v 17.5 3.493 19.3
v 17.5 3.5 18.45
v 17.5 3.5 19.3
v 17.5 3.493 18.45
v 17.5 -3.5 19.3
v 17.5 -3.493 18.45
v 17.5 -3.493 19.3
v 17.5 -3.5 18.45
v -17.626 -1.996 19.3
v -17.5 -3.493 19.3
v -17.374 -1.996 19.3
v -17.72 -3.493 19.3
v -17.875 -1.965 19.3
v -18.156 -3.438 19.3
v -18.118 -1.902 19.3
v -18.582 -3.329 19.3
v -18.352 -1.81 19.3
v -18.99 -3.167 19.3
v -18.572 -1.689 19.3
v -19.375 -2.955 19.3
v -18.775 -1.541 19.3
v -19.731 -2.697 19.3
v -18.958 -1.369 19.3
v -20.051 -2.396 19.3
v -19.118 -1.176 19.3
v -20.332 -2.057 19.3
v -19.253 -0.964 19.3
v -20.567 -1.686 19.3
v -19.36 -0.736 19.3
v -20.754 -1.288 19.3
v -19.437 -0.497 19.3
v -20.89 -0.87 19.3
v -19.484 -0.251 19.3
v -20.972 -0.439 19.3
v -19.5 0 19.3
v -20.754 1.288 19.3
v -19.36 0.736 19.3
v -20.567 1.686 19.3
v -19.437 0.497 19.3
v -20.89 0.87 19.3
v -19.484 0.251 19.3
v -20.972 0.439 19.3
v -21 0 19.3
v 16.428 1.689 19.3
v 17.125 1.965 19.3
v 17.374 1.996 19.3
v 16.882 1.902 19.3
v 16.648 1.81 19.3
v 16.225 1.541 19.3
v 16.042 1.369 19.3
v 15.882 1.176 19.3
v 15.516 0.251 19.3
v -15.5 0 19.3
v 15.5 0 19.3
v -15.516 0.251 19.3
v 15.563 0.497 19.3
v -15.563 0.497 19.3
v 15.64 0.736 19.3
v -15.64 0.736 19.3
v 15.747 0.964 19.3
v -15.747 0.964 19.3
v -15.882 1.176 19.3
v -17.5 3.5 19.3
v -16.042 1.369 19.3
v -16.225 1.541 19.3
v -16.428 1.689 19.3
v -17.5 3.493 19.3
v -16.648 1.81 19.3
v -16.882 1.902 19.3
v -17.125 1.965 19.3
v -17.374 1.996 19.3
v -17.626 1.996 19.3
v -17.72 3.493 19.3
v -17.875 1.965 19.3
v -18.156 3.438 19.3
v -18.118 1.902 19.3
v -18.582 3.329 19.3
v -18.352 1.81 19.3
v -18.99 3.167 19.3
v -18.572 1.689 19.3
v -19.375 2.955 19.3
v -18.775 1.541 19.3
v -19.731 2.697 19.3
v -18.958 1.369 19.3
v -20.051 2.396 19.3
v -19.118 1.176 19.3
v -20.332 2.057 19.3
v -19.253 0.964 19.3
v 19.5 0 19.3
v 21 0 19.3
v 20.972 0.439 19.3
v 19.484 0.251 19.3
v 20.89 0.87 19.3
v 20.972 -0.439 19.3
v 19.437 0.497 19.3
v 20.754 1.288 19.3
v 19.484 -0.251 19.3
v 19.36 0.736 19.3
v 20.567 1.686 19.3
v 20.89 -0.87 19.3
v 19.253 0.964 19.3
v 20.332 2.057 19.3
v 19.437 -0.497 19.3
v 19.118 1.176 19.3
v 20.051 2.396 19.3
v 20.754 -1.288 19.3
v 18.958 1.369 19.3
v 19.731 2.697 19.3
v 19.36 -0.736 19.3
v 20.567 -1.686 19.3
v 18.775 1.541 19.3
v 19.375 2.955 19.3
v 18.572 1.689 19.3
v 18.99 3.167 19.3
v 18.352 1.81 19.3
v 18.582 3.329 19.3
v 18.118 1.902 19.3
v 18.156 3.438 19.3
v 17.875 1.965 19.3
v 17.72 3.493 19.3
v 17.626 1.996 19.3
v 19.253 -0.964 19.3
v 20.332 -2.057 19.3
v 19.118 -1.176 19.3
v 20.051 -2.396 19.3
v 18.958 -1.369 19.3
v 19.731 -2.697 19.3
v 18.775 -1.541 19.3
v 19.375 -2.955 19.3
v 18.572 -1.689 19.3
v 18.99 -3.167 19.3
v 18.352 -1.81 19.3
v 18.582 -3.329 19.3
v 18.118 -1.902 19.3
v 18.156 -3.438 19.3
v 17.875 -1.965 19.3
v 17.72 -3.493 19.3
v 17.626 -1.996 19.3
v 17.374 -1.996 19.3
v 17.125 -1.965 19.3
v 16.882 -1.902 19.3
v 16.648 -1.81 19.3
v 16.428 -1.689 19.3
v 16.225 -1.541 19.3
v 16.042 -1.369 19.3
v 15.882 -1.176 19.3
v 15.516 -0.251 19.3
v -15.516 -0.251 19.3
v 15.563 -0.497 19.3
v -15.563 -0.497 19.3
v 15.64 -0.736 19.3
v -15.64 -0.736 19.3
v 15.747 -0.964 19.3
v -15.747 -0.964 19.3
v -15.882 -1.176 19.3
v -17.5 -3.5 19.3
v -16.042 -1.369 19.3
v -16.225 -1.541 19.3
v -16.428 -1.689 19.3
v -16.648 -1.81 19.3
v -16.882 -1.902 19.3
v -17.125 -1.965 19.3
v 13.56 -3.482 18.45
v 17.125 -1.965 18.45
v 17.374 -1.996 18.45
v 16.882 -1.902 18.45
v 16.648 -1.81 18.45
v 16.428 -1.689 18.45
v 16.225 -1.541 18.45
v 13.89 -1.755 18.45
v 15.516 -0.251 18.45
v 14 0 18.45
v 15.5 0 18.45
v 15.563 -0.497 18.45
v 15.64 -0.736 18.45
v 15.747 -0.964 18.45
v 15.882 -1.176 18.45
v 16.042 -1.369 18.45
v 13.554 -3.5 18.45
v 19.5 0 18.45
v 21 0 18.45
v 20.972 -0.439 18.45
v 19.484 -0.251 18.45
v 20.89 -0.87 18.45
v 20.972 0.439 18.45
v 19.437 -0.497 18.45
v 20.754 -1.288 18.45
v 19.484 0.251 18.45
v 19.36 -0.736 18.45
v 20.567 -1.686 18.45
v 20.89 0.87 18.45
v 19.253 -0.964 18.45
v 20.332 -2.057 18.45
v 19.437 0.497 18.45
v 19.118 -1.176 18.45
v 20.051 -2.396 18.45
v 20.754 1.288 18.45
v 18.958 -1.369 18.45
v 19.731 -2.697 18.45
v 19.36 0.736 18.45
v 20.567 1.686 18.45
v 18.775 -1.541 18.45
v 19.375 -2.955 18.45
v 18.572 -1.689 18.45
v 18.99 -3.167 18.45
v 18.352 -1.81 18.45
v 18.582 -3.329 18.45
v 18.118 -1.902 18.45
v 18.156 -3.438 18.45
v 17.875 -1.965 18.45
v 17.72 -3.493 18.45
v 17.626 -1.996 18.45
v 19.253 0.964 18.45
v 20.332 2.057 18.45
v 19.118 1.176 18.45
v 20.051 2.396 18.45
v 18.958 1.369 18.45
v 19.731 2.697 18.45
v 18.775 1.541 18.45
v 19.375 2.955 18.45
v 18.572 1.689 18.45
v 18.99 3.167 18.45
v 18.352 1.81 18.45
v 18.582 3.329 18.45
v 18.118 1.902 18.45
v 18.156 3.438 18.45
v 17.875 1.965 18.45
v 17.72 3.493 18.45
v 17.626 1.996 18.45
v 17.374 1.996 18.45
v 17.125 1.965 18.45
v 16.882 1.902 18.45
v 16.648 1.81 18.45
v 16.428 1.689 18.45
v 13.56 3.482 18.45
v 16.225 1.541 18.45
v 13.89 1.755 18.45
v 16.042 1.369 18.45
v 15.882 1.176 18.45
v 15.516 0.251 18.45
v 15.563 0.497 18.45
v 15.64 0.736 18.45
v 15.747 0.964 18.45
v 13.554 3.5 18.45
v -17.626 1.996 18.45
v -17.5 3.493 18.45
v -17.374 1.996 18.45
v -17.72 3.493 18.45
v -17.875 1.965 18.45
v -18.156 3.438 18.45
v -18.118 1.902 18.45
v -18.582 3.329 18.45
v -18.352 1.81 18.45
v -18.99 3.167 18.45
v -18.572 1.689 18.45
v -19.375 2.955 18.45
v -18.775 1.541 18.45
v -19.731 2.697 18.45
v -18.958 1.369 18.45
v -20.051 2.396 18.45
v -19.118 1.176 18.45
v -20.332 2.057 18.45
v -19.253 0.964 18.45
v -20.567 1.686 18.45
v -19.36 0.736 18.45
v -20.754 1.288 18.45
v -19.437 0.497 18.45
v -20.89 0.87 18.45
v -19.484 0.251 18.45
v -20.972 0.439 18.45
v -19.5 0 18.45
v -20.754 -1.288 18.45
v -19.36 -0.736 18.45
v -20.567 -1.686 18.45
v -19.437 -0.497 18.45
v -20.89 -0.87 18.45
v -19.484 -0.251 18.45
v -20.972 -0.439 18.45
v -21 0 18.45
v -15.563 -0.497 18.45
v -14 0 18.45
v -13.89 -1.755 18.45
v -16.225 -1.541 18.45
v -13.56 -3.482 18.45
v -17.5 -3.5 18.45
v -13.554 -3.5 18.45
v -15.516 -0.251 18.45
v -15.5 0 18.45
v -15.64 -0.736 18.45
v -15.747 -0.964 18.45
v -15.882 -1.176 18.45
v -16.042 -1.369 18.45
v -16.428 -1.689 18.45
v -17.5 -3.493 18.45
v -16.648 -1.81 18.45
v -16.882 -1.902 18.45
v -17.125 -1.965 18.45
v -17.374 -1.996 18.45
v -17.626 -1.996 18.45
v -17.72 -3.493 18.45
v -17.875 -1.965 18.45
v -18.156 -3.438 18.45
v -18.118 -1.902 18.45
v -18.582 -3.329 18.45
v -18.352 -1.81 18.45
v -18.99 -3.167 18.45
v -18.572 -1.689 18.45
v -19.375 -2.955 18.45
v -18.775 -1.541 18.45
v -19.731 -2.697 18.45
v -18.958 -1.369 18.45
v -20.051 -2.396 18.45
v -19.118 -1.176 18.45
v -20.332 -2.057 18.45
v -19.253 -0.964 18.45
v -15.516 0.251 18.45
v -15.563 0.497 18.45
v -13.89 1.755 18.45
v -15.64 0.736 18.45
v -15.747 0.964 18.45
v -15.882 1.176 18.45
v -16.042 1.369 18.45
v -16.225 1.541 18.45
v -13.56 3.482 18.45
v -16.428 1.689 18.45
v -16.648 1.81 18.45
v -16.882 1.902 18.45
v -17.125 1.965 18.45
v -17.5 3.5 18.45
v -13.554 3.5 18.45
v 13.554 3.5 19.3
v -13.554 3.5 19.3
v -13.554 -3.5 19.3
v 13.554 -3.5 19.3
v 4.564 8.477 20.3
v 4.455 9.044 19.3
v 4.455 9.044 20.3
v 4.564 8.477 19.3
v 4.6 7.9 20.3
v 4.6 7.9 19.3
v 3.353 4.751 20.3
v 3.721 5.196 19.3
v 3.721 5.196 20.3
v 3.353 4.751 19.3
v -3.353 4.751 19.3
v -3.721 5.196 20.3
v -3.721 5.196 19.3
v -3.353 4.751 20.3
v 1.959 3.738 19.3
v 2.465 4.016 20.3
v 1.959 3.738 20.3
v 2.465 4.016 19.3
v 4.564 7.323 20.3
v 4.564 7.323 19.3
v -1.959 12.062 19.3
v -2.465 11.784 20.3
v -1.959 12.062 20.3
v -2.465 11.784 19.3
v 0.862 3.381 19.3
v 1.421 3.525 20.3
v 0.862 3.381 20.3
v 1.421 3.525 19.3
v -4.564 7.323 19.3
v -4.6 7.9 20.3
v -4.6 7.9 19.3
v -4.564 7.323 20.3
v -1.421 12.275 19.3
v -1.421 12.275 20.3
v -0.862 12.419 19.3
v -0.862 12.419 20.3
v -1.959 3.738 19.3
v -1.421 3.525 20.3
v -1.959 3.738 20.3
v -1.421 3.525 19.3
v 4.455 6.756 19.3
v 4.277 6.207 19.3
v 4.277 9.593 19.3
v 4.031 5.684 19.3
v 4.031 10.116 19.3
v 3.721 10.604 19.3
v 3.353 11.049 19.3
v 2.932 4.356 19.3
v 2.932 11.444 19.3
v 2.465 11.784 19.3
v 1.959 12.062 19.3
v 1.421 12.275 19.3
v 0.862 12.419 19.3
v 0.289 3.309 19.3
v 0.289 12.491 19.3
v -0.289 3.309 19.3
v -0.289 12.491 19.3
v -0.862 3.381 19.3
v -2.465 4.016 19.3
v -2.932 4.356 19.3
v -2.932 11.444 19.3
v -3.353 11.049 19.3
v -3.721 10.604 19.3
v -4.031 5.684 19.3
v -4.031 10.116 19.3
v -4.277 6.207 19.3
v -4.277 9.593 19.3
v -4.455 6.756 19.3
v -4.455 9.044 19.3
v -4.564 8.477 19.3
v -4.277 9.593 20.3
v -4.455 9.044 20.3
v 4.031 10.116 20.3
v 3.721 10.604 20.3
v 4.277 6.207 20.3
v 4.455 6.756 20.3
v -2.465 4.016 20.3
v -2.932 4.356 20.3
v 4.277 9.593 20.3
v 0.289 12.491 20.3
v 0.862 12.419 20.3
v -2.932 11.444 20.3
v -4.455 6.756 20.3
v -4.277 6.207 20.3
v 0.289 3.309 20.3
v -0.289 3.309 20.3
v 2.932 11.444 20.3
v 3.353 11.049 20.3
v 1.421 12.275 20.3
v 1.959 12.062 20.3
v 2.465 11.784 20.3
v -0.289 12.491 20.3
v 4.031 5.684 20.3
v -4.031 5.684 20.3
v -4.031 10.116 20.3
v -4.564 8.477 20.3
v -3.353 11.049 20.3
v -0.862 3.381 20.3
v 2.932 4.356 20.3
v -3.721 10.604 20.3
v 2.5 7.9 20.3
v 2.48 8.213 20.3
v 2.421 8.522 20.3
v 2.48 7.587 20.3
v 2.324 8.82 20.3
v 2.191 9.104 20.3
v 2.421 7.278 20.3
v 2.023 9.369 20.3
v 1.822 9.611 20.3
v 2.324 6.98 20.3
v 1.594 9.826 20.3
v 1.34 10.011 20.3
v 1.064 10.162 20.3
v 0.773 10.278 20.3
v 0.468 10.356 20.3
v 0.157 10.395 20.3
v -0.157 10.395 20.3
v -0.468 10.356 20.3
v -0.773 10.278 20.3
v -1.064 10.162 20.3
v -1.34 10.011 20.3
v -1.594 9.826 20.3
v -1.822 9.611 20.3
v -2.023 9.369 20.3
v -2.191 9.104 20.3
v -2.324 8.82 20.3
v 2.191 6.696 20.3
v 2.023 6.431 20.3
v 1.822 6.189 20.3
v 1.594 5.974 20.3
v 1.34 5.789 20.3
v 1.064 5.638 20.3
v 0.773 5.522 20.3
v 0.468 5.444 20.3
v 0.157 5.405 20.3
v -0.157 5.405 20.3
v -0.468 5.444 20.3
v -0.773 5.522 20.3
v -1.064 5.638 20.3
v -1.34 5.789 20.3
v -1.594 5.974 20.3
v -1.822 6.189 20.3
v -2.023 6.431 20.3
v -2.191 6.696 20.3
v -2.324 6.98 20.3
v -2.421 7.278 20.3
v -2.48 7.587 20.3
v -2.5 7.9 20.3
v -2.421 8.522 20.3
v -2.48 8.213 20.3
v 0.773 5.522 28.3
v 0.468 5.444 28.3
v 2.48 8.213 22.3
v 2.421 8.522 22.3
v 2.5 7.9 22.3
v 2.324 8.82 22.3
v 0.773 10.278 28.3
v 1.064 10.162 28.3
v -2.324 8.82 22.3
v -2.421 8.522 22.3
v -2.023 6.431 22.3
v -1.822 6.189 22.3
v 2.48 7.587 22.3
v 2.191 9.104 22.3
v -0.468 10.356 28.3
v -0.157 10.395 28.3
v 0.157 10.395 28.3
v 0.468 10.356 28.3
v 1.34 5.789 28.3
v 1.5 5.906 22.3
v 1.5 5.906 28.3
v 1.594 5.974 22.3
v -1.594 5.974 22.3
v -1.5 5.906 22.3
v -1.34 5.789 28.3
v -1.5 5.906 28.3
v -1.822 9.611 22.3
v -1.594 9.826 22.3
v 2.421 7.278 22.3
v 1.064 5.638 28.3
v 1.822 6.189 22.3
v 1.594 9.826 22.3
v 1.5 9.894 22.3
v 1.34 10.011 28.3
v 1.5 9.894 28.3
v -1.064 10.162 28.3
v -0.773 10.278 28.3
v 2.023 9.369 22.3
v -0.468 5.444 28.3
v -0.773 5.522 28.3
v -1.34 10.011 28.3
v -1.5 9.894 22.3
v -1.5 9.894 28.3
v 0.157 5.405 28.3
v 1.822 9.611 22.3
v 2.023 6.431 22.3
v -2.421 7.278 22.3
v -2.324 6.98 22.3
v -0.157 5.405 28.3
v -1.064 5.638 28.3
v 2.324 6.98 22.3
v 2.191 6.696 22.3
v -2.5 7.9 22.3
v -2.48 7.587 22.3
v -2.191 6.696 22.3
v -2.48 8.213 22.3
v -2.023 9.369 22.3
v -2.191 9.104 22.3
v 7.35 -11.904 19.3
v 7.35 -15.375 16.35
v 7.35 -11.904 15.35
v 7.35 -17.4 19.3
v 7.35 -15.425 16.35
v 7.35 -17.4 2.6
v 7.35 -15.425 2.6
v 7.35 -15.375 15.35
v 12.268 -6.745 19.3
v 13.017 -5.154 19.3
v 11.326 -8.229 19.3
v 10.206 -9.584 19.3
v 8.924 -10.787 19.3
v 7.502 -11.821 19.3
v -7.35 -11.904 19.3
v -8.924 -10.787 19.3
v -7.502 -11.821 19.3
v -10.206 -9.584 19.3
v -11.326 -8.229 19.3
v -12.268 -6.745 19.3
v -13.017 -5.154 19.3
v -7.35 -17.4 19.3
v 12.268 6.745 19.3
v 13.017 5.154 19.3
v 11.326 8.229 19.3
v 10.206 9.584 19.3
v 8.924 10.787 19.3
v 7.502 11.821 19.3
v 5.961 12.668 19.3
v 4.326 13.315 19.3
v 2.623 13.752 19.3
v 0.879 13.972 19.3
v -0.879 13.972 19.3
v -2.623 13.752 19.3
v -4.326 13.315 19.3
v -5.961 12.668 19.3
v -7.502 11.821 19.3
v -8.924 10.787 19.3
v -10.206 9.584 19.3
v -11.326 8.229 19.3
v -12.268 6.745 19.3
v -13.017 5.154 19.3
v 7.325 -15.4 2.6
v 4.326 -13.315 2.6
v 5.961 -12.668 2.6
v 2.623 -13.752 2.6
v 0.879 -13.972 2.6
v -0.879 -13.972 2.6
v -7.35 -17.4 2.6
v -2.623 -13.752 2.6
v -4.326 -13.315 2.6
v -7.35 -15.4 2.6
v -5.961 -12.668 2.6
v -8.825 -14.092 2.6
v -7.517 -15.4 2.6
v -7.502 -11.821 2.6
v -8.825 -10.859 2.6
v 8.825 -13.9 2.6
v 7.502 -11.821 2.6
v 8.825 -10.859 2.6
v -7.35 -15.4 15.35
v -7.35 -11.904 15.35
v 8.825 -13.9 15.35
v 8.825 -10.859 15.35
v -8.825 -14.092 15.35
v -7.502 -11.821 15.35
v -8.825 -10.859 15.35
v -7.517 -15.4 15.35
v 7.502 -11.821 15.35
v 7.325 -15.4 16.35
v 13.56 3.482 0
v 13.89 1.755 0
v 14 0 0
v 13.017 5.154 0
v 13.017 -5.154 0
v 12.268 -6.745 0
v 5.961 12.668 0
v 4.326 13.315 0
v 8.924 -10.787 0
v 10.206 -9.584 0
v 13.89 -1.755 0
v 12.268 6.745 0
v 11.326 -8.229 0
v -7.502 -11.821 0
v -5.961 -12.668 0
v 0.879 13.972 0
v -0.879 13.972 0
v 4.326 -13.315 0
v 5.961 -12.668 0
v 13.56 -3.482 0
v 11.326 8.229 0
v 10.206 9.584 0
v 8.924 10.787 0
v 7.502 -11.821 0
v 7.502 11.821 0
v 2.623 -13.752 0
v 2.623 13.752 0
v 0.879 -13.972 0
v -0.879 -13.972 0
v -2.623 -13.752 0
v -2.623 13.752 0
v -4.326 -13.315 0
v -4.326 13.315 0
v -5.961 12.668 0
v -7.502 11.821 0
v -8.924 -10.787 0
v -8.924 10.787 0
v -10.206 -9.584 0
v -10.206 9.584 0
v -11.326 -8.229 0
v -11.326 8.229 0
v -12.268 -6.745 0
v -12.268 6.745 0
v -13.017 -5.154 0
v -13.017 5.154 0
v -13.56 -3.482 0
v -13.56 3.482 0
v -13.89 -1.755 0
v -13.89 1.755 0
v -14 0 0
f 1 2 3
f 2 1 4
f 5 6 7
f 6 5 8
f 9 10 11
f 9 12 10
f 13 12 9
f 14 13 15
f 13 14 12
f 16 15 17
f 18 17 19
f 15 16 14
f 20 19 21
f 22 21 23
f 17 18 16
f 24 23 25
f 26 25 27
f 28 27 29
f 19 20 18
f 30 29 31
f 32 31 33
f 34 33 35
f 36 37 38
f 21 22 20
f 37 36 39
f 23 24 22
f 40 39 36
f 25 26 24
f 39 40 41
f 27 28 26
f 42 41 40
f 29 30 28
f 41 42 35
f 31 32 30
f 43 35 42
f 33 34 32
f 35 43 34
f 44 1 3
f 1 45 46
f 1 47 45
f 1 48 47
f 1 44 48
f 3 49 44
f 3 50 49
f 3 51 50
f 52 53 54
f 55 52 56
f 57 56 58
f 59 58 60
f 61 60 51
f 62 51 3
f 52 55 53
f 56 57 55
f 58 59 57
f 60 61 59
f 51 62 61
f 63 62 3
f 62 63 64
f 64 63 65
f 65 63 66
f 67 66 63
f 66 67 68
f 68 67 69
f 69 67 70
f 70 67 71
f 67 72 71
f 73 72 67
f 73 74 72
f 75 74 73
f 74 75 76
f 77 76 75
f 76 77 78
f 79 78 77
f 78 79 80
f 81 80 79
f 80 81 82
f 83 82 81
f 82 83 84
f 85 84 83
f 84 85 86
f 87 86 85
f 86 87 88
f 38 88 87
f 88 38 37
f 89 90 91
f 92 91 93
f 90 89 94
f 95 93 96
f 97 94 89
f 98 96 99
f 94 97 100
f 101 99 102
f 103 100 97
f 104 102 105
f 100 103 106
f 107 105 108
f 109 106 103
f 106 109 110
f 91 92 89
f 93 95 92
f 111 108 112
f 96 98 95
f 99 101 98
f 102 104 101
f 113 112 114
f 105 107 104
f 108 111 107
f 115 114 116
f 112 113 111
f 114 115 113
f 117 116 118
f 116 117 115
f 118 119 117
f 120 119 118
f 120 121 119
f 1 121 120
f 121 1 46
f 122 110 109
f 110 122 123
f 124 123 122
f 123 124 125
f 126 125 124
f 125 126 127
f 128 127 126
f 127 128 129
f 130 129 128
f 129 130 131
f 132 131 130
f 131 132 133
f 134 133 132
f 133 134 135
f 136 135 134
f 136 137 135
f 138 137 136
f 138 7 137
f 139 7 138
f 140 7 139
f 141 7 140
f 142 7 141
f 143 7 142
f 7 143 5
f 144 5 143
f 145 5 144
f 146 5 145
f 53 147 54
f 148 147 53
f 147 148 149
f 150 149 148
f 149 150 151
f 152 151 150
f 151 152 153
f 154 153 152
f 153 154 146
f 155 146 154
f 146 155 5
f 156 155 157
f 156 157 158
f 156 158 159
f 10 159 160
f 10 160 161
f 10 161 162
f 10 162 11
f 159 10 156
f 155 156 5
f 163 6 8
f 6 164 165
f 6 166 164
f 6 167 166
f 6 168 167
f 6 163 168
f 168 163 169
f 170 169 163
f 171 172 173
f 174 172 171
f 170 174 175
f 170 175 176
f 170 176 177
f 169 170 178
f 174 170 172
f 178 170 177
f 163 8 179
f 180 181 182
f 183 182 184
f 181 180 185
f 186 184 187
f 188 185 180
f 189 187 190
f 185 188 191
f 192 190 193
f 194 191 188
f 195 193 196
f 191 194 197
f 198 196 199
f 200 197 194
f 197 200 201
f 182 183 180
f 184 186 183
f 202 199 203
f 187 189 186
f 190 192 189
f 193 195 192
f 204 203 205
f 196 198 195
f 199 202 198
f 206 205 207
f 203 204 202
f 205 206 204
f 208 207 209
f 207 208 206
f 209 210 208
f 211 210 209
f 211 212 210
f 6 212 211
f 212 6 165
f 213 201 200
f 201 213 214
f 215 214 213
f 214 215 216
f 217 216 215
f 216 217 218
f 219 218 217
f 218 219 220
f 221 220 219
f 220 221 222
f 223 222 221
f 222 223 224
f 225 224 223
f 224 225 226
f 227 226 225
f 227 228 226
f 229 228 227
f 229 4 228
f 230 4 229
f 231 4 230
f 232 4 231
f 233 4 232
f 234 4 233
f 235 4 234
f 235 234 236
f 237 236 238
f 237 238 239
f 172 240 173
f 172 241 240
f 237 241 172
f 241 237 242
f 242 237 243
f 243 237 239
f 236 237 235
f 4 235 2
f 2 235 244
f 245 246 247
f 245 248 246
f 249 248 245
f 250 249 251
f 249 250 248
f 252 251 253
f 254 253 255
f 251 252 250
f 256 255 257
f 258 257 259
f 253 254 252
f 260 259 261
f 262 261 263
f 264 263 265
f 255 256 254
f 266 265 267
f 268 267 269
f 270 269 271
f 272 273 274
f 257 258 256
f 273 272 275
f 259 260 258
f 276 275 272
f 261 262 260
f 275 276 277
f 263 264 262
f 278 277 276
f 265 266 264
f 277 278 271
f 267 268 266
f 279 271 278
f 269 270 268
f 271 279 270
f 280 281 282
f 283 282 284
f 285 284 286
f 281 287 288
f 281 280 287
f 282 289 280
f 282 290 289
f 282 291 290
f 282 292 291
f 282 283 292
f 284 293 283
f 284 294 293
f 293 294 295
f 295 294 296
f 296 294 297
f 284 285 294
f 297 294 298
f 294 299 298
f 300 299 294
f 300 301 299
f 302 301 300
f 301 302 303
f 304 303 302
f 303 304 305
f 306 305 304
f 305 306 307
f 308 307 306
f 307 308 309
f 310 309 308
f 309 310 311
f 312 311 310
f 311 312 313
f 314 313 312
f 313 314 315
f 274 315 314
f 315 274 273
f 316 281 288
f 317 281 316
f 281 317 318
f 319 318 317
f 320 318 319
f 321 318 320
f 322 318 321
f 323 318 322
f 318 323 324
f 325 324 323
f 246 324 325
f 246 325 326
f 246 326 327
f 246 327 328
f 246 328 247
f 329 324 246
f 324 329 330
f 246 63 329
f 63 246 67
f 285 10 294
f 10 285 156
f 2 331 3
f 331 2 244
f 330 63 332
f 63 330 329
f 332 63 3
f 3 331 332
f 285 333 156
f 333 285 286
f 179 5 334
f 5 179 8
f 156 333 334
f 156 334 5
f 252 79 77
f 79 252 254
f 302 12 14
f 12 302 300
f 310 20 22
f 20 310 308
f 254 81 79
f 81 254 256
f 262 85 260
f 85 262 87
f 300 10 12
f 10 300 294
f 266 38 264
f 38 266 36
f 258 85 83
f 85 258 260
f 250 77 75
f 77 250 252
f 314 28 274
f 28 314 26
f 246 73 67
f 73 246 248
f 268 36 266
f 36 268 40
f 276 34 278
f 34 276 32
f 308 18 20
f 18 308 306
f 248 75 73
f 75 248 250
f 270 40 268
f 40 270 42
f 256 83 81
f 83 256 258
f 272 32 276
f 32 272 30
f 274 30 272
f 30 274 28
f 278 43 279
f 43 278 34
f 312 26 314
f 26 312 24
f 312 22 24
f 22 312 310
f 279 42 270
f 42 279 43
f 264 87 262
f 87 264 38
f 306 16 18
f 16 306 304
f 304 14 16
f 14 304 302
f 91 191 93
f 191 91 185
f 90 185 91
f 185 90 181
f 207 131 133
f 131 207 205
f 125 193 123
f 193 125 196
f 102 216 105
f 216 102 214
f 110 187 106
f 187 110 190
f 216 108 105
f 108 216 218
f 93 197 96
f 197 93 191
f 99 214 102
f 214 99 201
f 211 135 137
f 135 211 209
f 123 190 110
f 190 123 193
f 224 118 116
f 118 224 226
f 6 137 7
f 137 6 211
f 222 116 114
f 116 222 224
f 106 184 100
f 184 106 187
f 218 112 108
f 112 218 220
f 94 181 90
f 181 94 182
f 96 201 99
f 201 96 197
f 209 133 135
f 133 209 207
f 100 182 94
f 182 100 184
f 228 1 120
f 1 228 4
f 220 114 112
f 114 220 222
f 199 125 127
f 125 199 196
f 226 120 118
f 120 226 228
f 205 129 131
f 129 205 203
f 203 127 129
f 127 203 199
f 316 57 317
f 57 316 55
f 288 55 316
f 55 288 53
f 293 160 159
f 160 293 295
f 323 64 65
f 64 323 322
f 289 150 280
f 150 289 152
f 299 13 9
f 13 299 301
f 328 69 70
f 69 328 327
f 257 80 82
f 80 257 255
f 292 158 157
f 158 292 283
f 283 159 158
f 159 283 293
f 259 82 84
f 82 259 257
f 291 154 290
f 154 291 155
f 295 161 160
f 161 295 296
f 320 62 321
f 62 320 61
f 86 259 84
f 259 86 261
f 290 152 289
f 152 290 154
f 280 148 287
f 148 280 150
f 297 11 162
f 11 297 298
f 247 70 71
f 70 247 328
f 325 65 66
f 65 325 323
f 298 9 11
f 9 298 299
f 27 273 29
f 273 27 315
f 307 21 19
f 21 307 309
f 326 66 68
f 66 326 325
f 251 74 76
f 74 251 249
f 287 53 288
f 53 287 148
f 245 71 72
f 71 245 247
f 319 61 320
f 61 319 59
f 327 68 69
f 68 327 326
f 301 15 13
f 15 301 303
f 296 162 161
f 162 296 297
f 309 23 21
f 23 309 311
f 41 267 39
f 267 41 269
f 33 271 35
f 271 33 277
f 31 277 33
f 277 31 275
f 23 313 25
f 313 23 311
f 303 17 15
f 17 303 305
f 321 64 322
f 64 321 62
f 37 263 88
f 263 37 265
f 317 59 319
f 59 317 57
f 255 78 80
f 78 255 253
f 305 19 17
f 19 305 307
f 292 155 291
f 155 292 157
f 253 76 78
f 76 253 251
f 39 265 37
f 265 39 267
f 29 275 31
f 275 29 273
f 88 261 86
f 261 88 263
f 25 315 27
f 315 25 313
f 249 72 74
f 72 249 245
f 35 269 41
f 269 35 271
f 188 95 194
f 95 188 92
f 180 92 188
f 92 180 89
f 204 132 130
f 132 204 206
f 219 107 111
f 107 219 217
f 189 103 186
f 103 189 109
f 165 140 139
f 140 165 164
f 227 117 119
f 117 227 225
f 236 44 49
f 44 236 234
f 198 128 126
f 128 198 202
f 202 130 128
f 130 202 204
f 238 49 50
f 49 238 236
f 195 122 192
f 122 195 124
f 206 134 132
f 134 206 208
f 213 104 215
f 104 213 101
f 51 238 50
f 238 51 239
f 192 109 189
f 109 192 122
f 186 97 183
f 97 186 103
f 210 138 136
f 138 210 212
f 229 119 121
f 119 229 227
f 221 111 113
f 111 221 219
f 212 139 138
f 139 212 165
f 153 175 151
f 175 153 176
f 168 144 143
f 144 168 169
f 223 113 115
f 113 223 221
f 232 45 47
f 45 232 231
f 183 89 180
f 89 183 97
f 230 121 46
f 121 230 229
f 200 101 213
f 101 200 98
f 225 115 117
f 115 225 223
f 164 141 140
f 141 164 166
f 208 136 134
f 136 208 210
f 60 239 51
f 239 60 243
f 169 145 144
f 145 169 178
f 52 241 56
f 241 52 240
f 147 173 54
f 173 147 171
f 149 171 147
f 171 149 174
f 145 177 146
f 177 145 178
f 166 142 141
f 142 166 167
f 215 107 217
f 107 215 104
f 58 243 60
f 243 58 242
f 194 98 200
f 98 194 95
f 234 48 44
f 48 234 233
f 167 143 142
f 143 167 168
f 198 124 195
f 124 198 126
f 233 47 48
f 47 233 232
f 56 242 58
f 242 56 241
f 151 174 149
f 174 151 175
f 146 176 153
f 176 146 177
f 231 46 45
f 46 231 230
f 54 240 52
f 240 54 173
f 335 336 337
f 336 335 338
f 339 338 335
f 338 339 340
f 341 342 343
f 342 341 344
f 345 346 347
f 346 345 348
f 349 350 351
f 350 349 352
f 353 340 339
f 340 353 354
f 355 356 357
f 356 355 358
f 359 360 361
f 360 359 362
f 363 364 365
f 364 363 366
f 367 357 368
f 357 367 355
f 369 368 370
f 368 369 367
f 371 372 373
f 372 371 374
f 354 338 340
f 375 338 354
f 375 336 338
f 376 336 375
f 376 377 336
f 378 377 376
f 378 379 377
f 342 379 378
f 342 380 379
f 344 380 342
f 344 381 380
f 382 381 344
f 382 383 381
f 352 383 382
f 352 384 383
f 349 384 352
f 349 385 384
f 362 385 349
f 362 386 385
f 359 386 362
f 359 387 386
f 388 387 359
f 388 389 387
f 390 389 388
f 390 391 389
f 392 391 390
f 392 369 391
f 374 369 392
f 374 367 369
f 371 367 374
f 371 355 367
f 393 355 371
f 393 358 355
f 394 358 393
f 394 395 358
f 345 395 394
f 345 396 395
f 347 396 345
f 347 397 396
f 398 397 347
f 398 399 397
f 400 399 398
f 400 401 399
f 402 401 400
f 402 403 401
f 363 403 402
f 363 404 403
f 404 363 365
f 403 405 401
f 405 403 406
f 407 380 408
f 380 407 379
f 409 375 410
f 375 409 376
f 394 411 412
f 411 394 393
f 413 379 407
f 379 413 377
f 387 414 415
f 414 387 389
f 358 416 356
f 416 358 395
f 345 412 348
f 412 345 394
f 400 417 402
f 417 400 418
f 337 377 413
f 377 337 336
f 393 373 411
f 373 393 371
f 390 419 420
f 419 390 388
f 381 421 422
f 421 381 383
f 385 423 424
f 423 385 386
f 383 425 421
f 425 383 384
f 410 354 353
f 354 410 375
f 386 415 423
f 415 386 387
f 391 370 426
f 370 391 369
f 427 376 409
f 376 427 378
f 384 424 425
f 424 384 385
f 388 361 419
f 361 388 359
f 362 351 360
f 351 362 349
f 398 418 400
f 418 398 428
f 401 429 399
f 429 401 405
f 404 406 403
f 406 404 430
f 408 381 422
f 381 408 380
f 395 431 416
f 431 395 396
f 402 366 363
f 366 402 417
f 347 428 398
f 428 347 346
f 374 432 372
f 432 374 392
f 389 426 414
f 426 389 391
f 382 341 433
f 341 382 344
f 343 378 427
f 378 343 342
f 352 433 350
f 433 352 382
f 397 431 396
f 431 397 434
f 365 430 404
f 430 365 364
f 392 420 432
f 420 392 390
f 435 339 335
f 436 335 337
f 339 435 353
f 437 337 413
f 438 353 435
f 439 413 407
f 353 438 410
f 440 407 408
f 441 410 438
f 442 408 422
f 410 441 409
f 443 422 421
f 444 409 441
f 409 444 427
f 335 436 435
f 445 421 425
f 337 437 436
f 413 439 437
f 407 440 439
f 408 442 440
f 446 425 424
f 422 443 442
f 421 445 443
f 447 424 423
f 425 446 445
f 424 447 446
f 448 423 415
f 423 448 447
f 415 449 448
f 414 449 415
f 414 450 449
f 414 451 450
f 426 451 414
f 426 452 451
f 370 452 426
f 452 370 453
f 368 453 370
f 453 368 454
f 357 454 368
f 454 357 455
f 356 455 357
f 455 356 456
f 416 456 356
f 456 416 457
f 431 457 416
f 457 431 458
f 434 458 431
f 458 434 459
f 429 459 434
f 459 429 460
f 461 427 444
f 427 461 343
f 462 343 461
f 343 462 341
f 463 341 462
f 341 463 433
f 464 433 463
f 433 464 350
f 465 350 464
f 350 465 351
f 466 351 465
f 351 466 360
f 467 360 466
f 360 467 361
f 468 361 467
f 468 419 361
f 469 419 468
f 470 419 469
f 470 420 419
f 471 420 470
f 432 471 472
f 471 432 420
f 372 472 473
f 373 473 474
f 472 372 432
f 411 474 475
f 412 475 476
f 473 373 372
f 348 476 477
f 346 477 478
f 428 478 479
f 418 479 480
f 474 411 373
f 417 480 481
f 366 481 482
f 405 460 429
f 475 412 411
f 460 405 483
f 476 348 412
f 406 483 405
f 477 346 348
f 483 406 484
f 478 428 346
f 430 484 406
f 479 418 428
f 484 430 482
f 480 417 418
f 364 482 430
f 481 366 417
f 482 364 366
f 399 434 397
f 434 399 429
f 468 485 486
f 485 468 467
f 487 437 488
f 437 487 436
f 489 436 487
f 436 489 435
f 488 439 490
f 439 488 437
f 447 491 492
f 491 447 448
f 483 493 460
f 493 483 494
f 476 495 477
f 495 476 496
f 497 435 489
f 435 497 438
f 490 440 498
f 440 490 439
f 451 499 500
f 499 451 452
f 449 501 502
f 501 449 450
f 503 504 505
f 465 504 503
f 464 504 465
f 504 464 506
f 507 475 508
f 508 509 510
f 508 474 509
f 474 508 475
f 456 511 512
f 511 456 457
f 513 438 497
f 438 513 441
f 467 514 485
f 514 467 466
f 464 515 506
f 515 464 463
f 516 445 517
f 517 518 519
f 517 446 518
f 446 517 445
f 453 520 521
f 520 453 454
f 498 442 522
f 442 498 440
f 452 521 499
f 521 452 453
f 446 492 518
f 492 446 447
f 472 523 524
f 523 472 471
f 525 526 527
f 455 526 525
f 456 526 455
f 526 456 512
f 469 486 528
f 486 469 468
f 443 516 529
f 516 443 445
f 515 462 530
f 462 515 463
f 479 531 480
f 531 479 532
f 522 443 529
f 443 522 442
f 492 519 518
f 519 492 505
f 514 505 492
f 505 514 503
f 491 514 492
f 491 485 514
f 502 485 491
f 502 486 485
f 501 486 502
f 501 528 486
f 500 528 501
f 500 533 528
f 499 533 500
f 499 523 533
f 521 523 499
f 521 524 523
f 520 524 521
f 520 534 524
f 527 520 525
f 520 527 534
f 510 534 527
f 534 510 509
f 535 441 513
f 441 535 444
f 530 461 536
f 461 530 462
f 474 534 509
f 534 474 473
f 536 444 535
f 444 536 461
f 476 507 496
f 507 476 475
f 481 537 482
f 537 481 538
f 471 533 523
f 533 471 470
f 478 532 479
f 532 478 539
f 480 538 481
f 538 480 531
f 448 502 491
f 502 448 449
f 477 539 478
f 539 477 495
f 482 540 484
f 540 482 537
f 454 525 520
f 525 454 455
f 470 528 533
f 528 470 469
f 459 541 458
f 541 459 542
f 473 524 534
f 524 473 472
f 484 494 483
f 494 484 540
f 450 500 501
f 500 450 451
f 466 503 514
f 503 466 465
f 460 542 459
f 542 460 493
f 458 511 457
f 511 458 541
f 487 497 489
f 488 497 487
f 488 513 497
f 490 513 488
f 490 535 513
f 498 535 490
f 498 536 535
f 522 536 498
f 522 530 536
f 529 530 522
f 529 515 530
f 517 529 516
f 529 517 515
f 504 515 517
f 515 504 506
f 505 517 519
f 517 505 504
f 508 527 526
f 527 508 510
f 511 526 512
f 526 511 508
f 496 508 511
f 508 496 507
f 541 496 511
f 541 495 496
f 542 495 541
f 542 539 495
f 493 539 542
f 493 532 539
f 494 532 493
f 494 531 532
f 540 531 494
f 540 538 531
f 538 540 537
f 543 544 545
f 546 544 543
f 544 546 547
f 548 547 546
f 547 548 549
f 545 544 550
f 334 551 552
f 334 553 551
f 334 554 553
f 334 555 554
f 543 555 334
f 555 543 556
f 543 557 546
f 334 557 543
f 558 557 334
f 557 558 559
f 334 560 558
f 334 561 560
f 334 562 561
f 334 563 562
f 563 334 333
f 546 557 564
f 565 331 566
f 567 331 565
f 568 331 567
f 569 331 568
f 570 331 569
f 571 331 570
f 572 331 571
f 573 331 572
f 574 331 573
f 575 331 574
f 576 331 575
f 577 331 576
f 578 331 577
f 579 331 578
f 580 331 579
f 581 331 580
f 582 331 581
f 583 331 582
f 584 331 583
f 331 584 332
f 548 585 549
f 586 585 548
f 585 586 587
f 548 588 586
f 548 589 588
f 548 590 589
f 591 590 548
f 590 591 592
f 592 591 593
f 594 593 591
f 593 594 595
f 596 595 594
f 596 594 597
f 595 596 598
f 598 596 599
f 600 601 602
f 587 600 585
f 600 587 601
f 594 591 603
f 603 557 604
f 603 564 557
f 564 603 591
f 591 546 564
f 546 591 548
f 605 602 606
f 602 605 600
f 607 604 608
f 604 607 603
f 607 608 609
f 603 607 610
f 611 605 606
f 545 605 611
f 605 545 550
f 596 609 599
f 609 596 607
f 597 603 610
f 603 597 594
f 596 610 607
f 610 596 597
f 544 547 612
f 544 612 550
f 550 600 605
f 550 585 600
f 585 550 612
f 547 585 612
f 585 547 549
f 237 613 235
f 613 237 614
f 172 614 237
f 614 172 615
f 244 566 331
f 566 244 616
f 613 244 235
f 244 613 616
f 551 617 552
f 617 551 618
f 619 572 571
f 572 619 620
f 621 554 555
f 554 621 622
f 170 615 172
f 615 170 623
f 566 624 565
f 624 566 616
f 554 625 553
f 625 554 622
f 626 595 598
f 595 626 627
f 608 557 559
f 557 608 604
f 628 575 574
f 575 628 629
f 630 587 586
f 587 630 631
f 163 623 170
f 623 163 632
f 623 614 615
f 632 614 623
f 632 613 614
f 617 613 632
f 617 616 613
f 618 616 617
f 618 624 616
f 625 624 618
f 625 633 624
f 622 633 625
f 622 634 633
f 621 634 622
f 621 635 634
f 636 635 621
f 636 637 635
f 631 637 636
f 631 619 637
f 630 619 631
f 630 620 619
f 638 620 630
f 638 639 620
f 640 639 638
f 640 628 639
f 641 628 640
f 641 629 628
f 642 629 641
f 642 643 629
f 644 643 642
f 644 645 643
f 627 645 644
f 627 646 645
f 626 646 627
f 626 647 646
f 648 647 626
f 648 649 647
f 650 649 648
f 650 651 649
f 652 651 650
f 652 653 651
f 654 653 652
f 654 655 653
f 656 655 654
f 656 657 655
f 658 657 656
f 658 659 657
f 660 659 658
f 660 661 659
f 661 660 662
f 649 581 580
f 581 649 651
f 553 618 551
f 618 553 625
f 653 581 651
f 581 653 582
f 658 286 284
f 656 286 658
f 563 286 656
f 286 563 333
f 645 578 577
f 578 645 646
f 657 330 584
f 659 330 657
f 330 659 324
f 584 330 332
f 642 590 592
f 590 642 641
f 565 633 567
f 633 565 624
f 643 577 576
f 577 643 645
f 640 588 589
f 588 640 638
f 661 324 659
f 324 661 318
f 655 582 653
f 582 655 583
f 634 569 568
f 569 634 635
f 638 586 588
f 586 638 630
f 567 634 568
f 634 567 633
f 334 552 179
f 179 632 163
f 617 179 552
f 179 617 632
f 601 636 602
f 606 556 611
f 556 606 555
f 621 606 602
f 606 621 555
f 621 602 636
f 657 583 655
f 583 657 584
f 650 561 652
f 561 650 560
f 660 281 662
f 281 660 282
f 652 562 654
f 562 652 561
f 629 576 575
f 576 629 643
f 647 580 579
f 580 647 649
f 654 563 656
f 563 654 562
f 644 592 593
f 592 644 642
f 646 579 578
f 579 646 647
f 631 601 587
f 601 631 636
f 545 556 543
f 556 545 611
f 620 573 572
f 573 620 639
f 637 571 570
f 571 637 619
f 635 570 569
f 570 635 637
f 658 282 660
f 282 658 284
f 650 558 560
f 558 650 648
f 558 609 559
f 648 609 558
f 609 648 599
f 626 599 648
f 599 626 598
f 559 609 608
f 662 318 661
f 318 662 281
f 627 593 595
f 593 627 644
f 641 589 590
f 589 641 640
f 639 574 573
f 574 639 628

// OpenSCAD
//
// 28BYJ_48 5V Geared Stepper Motor Model
// 
// Author : Steven Knudsen
// 
// Copyright : This work is licensed under a Creative Commons Attribution 4.0 International License.
//

// Useful constants
 28BYJ_48_MotorBodyDia    = 28; // mm
 28BYJ_48_MotorBodyHeight = 19.3; // mm
 
 
 // shaft
 28BYJ_48_ShaftDia        = 5; // mm
 28BYJ_48_ShaftFlatWidth  = 3; // mm
 28BYJ_48_ShaftFlatLength = 6; // mm 
 28BYJ_48_ShaftLength     = 8; // mm
 
   // housing tab
 28BYJ_48_TabThick          =  0.85; // mm
 28BYJ_48_TabTotalWidth     = 42.0; // mm
 28BYJ_48_TabHoleSeparation = 35.0; // mm
 28BYJ_48_TabHoleDia        =  4.0; // mm

 module gearedMotor28BYJ_48() {
  $fn=50;

   // raised disk at shaft base   
   shaftBaseDia    = 9.2; // mm
   shaftBaseHeight = 1.0; // mm
   shaftBaseInset  = 1.5; // mm
   
   // shaft
   shaftFlatStart = 2; // mm above the base
   
   // housing tab
   tabDepth          =  7.0; // mm
   
   // motor body
   cylinder(r=28BYJ_48_MotorBodyDia/2, h= 28BYJ_48_MotorBodyHeight);
   
   // tabs
   translate([-28BYJ_48_TabTotalWidth/2,-tabDepth/2,28BYJ_48_MotorBodyHeight-28BYJ_48_TabThick])
   difference() {
     union() {
       // extend tab all the way across the top of the motor
       translate([tabDepth/2,0,0]) cube([28BYJ_48_TabTotalWidth-tabDepth,tabDepth,28BYJ_48_TabThick]);
       // add rounded ends
       translate([tabDepth/2,tabDepth/2,0]) cylinder(r=tabDepth/2, h=28BYJ_48_TabThick);
       translate([28BYJ_48_TabTotalWidth-tabDepth/2,tabDepth/2,0]) cylinder(r=tabDepth/2, h=28BYJ_48_TabThick);
     }
     // punch holes
     color("green") {
       translate([tabDepth/2,tabDepth/2,-1]) cylinder(r=28BYJ_48_TabHoleDia/2, h=28BYJ_48_TabThick+2);
       translate([28BYJ_48_TabTotalWidth-tabDepth/2,tabDepth/2,-1]) cylinder(r=28BYJ_48_TabHoleDia/2, h=28BYJ_48_TabThick+2);
     }
   }
   
   // shaft base and shaft
   color("brown") {
   translate([0,28BYJ_48_MotorBodyDia/2-shaftBaseDia/2-shaftBaseInset,28BYJ_48_MotorBodyHeight])
     difference() {
       union() {
         cylinder(r=shaftBaseDia/2, h=shaftBaseHeight);
         cylinder(r=28BYJ_48_ShaftDia/2, h=shaftBaseHeight+28BYJ_48_ShaftLength);
       }
       translate([28BYJ_48_ShaftFlatWidth/2,-28BYJ_48_ShaftDia/2-1,shaftBaseHeight+shaftFlatStart])
         cube([28BYJ_48_ShaftDia,28BYJ_48_ShaftDia+2,28BYJ_48_ShaftLength]);
       translate([-28BYJ_48_ShaftDia-28BYJ_48_ShaftFlatWidth/2,-28BYJ_48_ShaftDia/2-1,shaftBaseHeight+shaftFlatStart])
         cube([28BYJ_48_ShaftDia,28BYJ_48_ShaftDia+2,28BYJ_48_ShaftLength]);
     }
   }
   
   // wire housing
   housingTopWidth = 14.7; // mm
   housingHeight = 16.7; // mm
   housingDepth = 31.4 - 28BYJ_48_MotorBodyDia; // mm
   housingFlangeWidth = 17.65; // mm
   housingFlangeHeight = 12.75; // mm
   
   difference() {
     color("blue") {
       union() {
         translate([-housingTopWidth/2,-28BYJ_48_MotorBodyDia/2-housingDepth,28BYJ_48_MotorBodyHeight-housingHeight])
           cube([housingTopWidth,2*housingDepth,housingHeight]);
         translate([-housingFlangeWidth/2,-28BYJ_48_MotorBodyDia/2-housingDepth+2,28BYJ_48_MotorBodyHeight-housingHeight])
           cube([housingFlangeWidth,2*housingDepth,housingFlangeHeight]);
       }
     }
     color("black") {
       translate([-housingFlangeWidth/2-1,-28BYJ_48_MotorBodyDia/2-housingDepth-.5,28BYJ_48_MotorBodyHeight-housingHeight-1])
         rotate([0,0,45])
         cube([housingDepth,housingDepth,housingFlangeHeight+2]);
       translate([housingFlangeWidth/2-1.5,-28BYJ_48_MotorBodyDia/2-housingDepth+2,28BYJ_48_MotorBodyHeight-housingHeight-1])
         rotate([0,0,-45])
         cube([housingDepth,housingDepth,housingFlangeHeight+2]);
     }
   }
 }
 
 gearedMotor28BYJ_48();
